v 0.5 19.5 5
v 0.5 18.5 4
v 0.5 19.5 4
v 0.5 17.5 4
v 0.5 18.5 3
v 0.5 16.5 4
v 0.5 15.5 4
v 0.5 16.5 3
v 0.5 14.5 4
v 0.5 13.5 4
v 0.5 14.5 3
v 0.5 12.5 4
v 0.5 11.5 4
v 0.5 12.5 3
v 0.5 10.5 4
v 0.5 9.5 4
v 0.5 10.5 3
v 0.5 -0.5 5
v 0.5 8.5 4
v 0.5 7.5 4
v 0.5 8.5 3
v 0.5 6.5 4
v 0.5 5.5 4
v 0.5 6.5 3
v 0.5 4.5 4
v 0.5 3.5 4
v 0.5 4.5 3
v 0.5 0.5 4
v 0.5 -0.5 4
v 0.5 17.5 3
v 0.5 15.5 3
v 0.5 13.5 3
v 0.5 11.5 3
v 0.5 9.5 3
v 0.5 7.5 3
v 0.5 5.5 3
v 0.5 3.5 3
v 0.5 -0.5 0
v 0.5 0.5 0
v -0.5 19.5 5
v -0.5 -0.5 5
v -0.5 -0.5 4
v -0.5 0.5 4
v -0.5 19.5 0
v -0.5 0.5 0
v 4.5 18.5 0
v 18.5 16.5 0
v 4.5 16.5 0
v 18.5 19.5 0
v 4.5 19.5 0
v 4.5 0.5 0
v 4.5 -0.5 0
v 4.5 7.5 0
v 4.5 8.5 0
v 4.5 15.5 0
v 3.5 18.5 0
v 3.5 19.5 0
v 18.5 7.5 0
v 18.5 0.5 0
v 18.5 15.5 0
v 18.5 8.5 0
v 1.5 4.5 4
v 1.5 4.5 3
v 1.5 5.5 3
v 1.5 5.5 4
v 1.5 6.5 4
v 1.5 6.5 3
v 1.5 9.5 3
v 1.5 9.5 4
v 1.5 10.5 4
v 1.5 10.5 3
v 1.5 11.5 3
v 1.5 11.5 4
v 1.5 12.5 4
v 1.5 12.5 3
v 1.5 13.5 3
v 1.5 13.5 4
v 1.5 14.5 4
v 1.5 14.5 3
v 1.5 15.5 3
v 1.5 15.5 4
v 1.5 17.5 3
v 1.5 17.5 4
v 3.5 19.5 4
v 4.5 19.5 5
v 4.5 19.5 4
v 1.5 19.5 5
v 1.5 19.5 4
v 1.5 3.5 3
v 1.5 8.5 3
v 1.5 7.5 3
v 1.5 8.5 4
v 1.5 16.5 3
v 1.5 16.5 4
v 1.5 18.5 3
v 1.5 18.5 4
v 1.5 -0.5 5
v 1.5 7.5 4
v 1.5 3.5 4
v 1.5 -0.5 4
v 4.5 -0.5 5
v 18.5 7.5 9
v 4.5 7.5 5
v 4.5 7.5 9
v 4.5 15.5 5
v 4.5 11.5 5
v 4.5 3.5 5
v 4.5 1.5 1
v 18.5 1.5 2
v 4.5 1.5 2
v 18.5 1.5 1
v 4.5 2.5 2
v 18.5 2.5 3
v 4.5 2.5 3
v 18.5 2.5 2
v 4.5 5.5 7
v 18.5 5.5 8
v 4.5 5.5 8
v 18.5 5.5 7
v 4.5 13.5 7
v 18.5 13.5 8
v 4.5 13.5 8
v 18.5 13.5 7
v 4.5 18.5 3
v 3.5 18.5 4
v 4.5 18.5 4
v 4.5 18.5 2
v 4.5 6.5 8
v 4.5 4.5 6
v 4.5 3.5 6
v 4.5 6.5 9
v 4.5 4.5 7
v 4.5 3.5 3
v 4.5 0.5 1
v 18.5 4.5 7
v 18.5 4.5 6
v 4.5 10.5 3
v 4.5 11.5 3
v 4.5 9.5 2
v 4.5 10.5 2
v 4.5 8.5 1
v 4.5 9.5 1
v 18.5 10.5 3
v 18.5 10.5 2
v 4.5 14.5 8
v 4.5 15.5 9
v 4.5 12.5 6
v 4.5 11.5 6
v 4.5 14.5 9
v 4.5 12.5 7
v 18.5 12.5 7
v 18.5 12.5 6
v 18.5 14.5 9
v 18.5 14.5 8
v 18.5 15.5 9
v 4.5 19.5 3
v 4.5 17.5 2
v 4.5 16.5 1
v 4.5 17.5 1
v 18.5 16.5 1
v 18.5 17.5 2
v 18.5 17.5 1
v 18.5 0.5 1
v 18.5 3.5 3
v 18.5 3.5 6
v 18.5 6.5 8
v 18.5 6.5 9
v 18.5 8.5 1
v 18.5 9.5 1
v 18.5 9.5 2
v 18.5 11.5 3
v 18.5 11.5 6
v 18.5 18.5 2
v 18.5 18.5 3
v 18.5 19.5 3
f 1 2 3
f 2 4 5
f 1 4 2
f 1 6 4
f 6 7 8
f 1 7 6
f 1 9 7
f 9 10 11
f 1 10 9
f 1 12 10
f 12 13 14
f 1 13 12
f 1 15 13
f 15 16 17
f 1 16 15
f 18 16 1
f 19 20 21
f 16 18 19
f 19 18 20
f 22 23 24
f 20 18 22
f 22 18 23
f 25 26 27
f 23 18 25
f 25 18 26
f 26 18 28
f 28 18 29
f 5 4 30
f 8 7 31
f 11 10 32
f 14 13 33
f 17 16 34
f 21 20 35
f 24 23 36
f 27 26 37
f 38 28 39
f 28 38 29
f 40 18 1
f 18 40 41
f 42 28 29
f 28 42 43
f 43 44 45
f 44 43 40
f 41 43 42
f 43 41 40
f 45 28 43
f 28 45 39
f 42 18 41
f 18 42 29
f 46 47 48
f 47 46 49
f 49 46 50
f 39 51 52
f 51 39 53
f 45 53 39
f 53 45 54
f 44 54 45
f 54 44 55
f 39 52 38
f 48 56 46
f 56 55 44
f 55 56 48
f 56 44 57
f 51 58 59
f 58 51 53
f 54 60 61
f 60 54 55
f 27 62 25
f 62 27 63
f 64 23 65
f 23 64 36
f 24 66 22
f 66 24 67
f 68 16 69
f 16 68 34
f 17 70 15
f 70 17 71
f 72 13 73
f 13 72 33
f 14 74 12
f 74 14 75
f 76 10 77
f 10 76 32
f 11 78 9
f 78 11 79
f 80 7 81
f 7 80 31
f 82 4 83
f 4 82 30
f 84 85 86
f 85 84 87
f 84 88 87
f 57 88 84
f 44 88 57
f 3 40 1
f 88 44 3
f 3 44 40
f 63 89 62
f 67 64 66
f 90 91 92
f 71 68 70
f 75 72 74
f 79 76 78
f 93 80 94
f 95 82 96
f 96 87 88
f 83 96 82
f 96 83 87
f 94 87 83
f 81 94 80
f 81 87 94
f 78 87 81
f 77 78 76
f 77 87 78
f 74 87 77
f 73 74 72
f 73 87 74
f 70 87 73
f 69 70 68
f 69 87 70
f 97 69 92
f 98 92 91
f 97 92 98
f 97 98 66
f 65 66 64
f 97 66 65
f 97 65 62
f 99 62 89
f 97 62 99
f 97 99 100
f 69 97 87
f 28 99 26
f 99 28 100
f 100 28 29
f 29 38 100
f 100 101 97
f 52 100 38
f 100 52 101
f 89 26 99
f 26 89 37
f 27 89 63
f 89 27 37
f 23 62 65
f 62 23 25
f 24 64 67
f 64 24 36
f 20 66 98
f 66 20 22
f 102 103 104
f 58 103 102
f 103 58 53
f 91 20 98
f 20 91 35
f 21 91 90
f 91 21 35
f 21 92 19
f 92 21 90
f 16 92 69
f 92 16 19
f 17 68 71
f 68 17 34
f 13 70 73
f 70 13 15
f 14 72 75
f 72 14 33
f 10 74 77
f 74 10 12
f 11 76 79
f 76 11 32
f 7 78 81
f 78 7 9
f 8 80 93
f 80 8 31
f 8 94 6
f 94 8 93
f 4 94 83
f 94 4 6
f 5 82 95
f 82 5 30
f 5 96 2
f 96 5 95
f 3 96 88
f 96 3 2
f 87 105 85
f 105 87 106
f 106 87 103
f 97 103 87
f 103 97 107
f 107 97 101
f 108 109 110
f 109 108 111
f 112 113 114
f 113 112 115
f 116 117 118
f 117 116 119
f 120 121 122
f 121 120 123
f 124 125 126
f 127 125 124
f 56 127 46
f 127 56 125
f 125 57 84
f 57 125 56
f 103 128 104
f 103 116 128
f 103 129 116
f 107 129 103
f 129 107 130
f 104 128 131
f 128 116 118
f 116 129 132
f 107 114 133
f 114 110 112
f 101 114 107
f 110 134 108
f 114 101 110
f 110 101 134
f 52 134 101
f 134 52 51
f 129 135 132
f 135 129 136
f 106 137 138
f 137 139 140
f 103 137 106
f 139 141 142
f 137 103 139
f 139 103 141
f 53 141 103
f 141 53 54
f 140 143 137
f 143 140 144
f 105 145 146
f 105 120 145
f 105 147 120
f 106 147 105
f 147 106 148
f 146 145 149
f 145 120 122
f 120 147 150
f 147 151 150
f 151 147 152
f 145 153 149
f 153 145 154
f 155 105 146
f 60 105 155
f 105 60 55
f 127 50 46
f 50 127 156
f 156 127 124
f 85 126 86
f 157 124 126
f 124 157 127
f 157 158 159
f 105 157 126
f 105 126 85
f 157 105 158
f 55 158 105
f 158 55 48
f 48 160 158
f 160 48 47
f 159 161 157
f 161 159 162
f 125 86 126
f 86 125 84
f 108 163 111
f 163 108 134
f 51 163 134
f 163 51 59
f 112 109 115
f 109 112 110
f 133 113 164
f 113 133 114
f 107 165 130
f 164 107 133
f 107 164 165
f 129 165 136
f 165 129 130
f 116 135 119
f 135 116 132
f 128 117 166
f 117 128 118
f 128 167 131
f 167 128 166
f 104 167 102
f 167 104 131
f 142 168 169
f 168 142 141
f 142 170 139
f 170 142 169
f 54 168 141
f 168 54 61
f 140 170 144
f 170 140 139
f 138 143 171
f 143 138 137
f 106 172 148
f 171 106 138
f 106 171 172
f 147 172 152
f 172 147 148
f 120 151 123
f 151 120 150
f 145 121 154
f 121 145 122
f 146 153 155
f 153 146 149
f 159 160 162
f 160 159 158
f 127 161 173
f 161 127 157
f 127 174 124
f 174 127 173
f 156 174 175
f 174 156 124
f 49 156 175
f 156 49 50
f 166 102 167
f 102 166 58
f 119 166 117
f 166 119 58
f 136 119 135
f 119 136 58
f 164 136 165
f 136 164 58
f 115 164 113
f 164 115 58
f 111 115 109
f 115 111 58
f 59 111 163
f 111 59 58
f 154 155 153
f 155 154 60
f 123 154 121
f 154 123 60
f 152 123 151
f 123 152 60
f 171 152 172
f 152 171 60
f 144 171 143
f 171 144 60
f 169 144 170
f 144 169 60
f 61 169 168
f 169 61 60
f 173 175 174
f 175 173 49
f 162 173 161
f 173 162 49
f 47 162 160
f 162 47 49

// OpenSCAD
union() {
    translate([0, 0, 4.5]) color([1, 0, 0]) cube([1, 1, 1], center=true);
    translate([0, 1, 2.5]) cube([1, 1, 5], center=true);
    translate([0, 2, 2.5]) cube([1, 1, 5], center=true);
    translate([0, 3, 2.5]) cube([1, 1, 5], center=true);
    translate([0, 4, 2.5]) cube([1, 1, 5], center=true);
    translate([0, 5, 2.5]) cube([1, 1, 5], center=true);
    translate([0, 6, 2.5]) cube([1, 1, 5], center=true);
    translate([0, 7, 2.5]) cube([1, 1, 5], center=true);
    translate([0, 8, 2.5]) cube([1, 1, 5], center=true);
    translate([0, 9, 2.5]) cube([1, 1, 5], center=true);
    translate([0, 10, 2.5]) cube([1, 1, 5], center=true);
    translate([0, 11, 2.5]) cube([1, 1, 5], center=true);
    translate([0, 12, 2.5]) cube([1, 1, 5], center=true);
    translate([0, 13, 2.5]) cube([1, 1, 5], center=true);
    translate([0, 14, 2.5]) cube([1, 1, 5], center=true);
    translate([0, 15, 2.5]) cube([1, 1, 5], center=true);
    translate([0, 16, 2.5]) cube([1, 1, 5], center=true);
    translate([0, 17, 2.5]) cube([1, 1, 5], center=true);
    translate([0, 18, 2.5]) cube([1, 1, 5], center=true);
    translate([0, 19, 2.5]) cube([1, 1, 5], center=true);
    translate([1, 0, 2.0]) cube([1, 1, 4], center=true);
    translate([1, 1, 2.0]) cube([1, 1, 4], center=true);
    translate([1, 2, 2.0]) cube([1, 1, 4], center=true);
    translate([1, 3, 2.0]) cube([1, 1, 4], center=true);
    translate([1, 4, 1.5]) cube([1, 1, 3], center=true);
    translate([1, 5, 2.0]) cube([1, 1, 4], center=true);
    translate([1, 6, 1.5]) cube([1, 1, 3], center=true);
    translate([1, 7, 2.0]) cube([1, 1, 4], center=true);
    translate([1, 8, 1.5]) cube([1, 1, 3], center=true);
    translate([1, 9, 2.0]) cube([1, 1, 4], center=true);
    translate([1, 10, 1.5]) cube([1, 1, 3], center=true);
    translate([1, 11, 2.0]) cube([1, 1, 4], center=true);
    translate([1, 12, 1.5]) cube([1, 1, 3], center=true);
    translate([1, 13, 2.0]) cube([1, 1, 4], center=true);
    translate([1, 14, 1.5]) cube([1, 1, 3], center=true);
    translate([1, 15, 2.0]) cube([1, 1, 4], center=true);
    translate([1, 16, 1.5]) cube([1, 1, 3], center=true);
    translate([1, 17, 2.0]) cube([1, 1, 4], center=true);
    translate([1, 18, 1.5]) cube([1, 1, 3], center=true);
    translate([1, 19, 2.0]) cube([1, 1, 4], center=true);
    translate([2, 0, 2.5]) cube([1, 1, 5], center=true);
    translate([2, 1, 2.5]) cube([1, 1, 5], center=true);
    translate([2, 2, 2.5]) cube([1, 1, 5], center=true);
    translate([2, 3, 2.5]) cube([1, 1, 5], center=true);
    translate([2, 4, 2.5]) cube([1, 1, 5], center=true);
    translate([2, 5, 2.5]) cube([1, 1, 5], center=true);
    translate([2, 6, 2.5]) cube([1, 1, 5], center=true);
    translate([2, 7, 2.5]) cube([1, 1, 5], center=true);
    translate([2, 8, 2.5]) cube([1, 1, 5], center=true);
    translate([2, 9, 2.5]) cube([1, 1, 5], center=true);
    translate([2, 10, 2.5]) cube([1, 1, 5], center=true);
    translate([2, 11, 2.5]) cube([1, 1, 5], center=true);
    translate([2, 12, 2.5]) cube([1, 1, 5], center=true);
    translate([2, 13, 2.5]) cube([1, 1, 5], center=true);
    translate([2, 14, 2.5]) cube([1, 1, 5], center=true);
    translate([2, 15, 2.5]) cube([1, 1, 5], center=true);
    translate([2, 16, 2.5]) cube([1, 1, 5], center=true);
    translate([2, 17, 2.5]) cube([1, 1, 5], center=true);
    translate([2, 18, 2.5]) cube([1, 1, 5], center=true);
    translate([2, 19, 2.5]) cube([1, 1, 5], center=true);
    translate([3, 0, 2.5]) cube([1, 1, 5], center=true);
    translate([3, 1, 2.5]) cube([1, 1, 5], center=true);
    translate([3, 2, 2.5]) cube([1, 1, 5], center=true);
    translate([3, 3, 2.5]) cube([1, 1, 5], center=true);
    translate([3, 4, 2.5]) cube([1, 1, 5], center=true);
    translate([3, 5, 2.5]) cube([1, 1, 5], center=true);
    translate([3, 6, 2.5]) cube([1, 1, 5], center=true);
    translate([3, 7, 2.5]) cube([1, 1, 5], center=true);
    translate([3, 8, 2.5]) cube([1, 1, 5], center=true);
    translate([3, 9, 2.5]) cube([1, 1, 5], center=true);
    translate([3, 10, 2.5]) cube([1, 1, 5], center=true);
    translate([3, 11, 2.5]) cube([1, 1, 5], center=true);
    translate([3, 12, 2.5]) cube([1, 1, 5], center=true);
    translate([3, 13, 2.5]) cube([1, 1, 5], center=true);
    translate([3, 14, 2.5]) cube([1, 1, 5], center=true);
    translate([3, 15, 2.5]) cube([1, 1, 5], center=true);
    translate([3, 16, 2.5]) cube([1, 1, 5], center=true);
    translate([3, 17, 2.5]) cube([1, 1, 5], center=true);
    translate([3, 18, 2.5]) cube([1, 1, 5], center=true);
    translate([3, 19, 2.5]) cube([1, 1, 5], center=true);
    translate([4, 0, 2.5]) cube([1, 1, 5], center=true);
    translate([4, 1, 2.5]) cube([1, 1, 5], center=true);
    translate([4, 2, 2.5]) cube([1, 1, 5], center=true);
    translate([4, 3, 2.5]) cube([1, 1, 5], center=true);
    translate([4, 4, 2.5]) cube([1, 1, 5], center=true);
    translate([4, 5, 2.5]) cube([1, 1, 5], center=true);
    translate([4, 6, 2.5]) cube([1, 1, 5], center=true);
    translate([4, 7, 2.5]) cube([1, 1, 5], center=true);
    translate([4, 8, 2.5]) cube([1, 1, 5], center=true);
    translate([4, 9, 2.5]) cube([1, 1, 5], center=true);
    translate([4, 10, 2.5]) cube([1, 1, 5], center=true);
    translate([4, 11, 2.5]) cube([1, 1, 5], center=true);
    translate([4, 12, 2.5]) cube([1, 1, 5], center=true);
    translate([4, 13, 2.5]) cube([1, 1, 5], center=true);
    translate([4, 14, 2.5]) cube([1, 1, 5], center=true);
    translate([4, 15, 2.5]) cube([1, 1, 5], center=true);
    translate([4, 16, 2.5]) cube([1, 1, 5], center=true);
    translate([4, 17, 2.5]) cube([1, 1, 5], center=true);
    translate([4, 18, 2.5]) cube([1, 1, 5], center=true);
    translate([4, 19, 4.5]) color([0, 0, 1]) cube([1, 1, 1], center=true);
    translate([5, 1, 0.5]) cube([1, 1, 1], center=true);
    translate([5, 2, 1.0]) cube([1, 1, 2], center=true);
    translate([5, 3, 1.5]) cube([1, 1, 3], center=true);
    translate([5, 4, 3.0]) cube([1, 1, 6], center=true);
    translate([5, 5, 3.5]) cube([1, 1, 7], center=true);
    translate([5, 6, 4.0]) cube([1, 1, 8], center=true);
    translate([5, 7, 4.5]) cube([1, 1, 9], center=true);
    translate([5, 9, 0.5]) cube([1, 1, 1], center=true);
    translate([5, 10, 1.0]) cube([1, 1, 2], center=true);
    translate([5, 11, 1.5]) cube([1, 1, 3], center=true);
    translate([5, 12, 3.0]) cube([1, 1, 6], center=true);
    translate([5, 13, 3.5]) cube([1, 1, 7], center=true);
    translate([5, 14, 4.0]) cube([1, 1, 8], center=true);
    translate([5, 15, 4.5]) cube([1, 1, 9], center=true);
    translate([5, 17, 0.5]) cube([1, 1, 1], center=true);
    translate([5, 18, 1.0]) cube([1, 1, 2], center=true);
    translate([5, 19, 1.5]) cube([1, 1, 3], center=true);
    translate([6, 1, 0.5]) cube([1, 1, 1], center=true);
    translate([6, 2, 1.0]) cube([1, 1, 2], center=true);
    translate([6, 3, 1.5]) cube([1, 1, 3], center=true);
    translate([6, 4, 3.0]) cube([1, 1, 6], center=true);
    translate([6, 5, 3.5]) cube([1, 1, 7], center=true);
    translate([6, 6, 4.0]) cube([1, 1, 8], center=true);
    translate([6, 7, 4.5]) cube([1, 1, 9], center=true);
    translate([6, 9, 0.5]) cube([1, 1, 1], center=true);
    translate([6, 10, 1.0]) cube([1, 1, 2], center=true);
    translate([6, 11, 1.5]) cube([1, 1, 3], center=true);
    translate([6, 12, 3.0]) cube([1, 1, 6], center=true);
    translate([6, 13, 3.5]) cube([1, 1, 7], center=true);
    translate([6, 14, 4.0]) cube([1, 1, 8], center=true);
    translate([6, 15, 4.5]) cube([1, 1, 9], center=true);
    translate([6, 17, 0.5]) cube([1, 1, 1], center=true);
    translate([6, 18, 1.0]) cube([1, 1, 2], center=true);
    translate([6, 19, 1.5]) cube([1, 1, 3], center=true);
    translate([7, 1, 0.5]) cube([1, 1, 1], center=true);
    translate([7, 2, 1.0]) cube([1, 1, 2], center=true);
    translate([7, 3, 1.5]) cube([1, 1, 3], center=true);
    translate([7, 4, 3.0]) cube([1, 1, 6], center=true);
    translate([7, 5, 3.5]) cube([1, 1, 7], center=true);
    translate([7, 6, 4.0]) cube([1, 1, 8], center=true);
    translate([7, 7, 4.5]) cube([1, 1, 9], center=true);
    translate([7, 9, 0.5]) cube([1, 1, 1], center=true);
    translate([7, 10, 1.0]) cube([1, 1, 2], center=true);
    translate([7, 11, 1.5]) cube([1, 1, 3], center=true);
    translate([7, 12, 3.0]) cube([1, 1, 6], center=true);
    translate([7, 13, 3.5]) cube([1, 1, 7], center=true);
    translate([7, 14, 4.0]) cube([1, 1, 8], center=true);
    translate([7, 15, 4.5]) cube([1, 1, 9], center=true);
    translate([7, 17, 0.5]) cube([1, 1, 1], center=true);
    translate([7, 18, 1.0]) cube([1, 1, 2], center=true);
    translate([7, 19, 1.5]) cube([1, 1, 3], center=true);
    translate([8, 1, 0.5]) cube([1, 1, 1], center=true);
    translate([8, 2, 1.0]) cube([1, 1, 2], center=true);
    translate([8, 3, 1.5]) cube([1, 1, 3], center=true);
    translate([8, 4, 3.0]) cube([1, 1, 6], center=true);
    translate([8, 5, 3.5]) cube([1, 1, 7], center=true);
    translate([8, 6, 4.0]) cube([1, 1, 8], center=true);
    translate([8, 7, 4.5]) cube([1, 1, 9], center=true);
    translate([8, 9, 0.5]) cube([1, 1, 1], center=true);
    translate([8, 10, 1.0]) cube([1, 1, 2], center=true);
    translate([8, 11, 1.5]) cube([1, 1, 3], center=true);
    translate([8, 12, 3.0]) cube([1, 1, 6], center=true);
    translate([8, 13, 3.5]) cube([1, 1, 7], center=true);
    translate([8, 14, 4.0]) cube([1, 1, 8], center=true);
    translate([8, 15, 4.5]) cube([1, 1, 9], center=true);
    translate([8, 17, 0.5]) cube([1, 1, 1], center=true);
    translate([8, 18, 1.0]) cube([1, 1, 2], center=true);
    translate([8, 19, 1.5]) cube([1, 1, 3], center=true);
    translate([9, 1, 0.5]) cube([1, 1, 1], center=true);
    translate([9, 2, 1.0]) cube([1, 1, 2], center=true);
    translate([9, 3, 1.5]) cube([1, 1, 3], center=true);
    translate([9, 4, 3.0]) cube([1, 1, 6], center=true);
    translate([9, 5, 3.5]) cube([1, 1, 7], center=true);
    translate([9, 6, 4.0]) cube([1, 1, 8], center=true);
    translate([9, 7, 4.5]) cube([1, 1, 9], center=true);
    translate([9, 9, 0.5]) cube([1, 1, 1], center=true);
    translate([9, 10, 1.0]) cube([1, 1, 2], center=true);
    translate([9, 11, 1.5]) cube([1, 1, 3], center=true);
    translate([9, 12, 3.0]) cube([1, 1, 6], center=true);
    translate([9, 13, 3.5]) cube([1, 1, 7], center=true);
    translate([9, 14, 4.0]) cube([1, 1, 8], center=true);
    translate([9, 15, 4.5]) cube([1, 1, 9], center=true);
    translate([9, 17, 0.5]) cube([1, 1, 1], center=true);
    translate([9, 18, 1.0]) cube([1, 1, 2], center=true);
    translate([9, 19, 1.5]) cube([1, 1, 3], center=true);
    translate([10, 1, 0.5]) cube([1, 1, 1], center=true);
    translate([10, 2, 1.0]) cube([1, 1, 2], center=true);
    translate([10, 3, 1.5]) cube([1, 1, 3], center=true);
    translate([10, 4, 3.0]) cube([1, 1, 6], center=true);
    translate([10, 5, 3.5]) cube([1, 1, 7], center=true);
    translate([10, 6, 4.0]) cube([1, 1, 8], center=true);
    translate([10, 7, 4.5]) cube([1, 1, 9], center=true);
    translate([10, 9, 0.5]) cube([1, 1, 1], center=true);
    translate([10, 10, 1.0]) cube([1, 1, 2], center=true);
    translate([10, 11, 1.5]) cube([1, 1, 3], center=true);
    translate([10, 12, 3.0]) cube([1, 1, 6], center=true);
    translate([10, 13, 3.5]) cube([1, 1, 7], center=true);
    translate([10, 14, 4.0]) cube([1, 1, 8], center=true);
    translate([10, 15, 4.5]) cube([1, 1, 9], center=true);
    translate([10, 17, 0.5]) cube([1, 1, 1], center=true);
    translate([10, 18, 1.0]) cube([1, 1, 2], center=true);
    translate([10, 19, 1.5]) cube([1, 1, 3], center=true);
    translate([11, 1, 0.5]) cube([1, 1, 1], center=true);
    translate([11, 2, 1.0]) cube([1, 1, 2], center=true);
    translate([11, 3, 1.5]) cube([1, 1, 3], center=true);
    translate([11, 4, 3.0]) cube([1, 1, 6], center=true);
    translate([11, 5, 3.5]) cube([1, 1, 7], center=true);
    translate([11, 6, 4.0]) cube([1, 1, 8], center=true);
    translate([11, 7, 4.5]) cube([1, 1, 9], center=true);
    translate([11, 9, 0.5]) cube([1, 1, 1], center=true);
    translate([11, 10, 1.0]) cube([1, 1, 2], center=true);
    translate([11, 11, 1.5]) cube([1, 1, 3], center=true);
    translate([11, 12, 3.0]) cube([1, 1, 6], center=true);
    translate([11, 13, 3.5]) cube([1, 1, 7], center=true);
    translate([11, 14, 4.0]) cube([1, 1, 8], center=true);
    translate([11, 15, 4.5]) cube([1, 1, 9], center=true);
    translate([11, 17, 0.5]) cube([1, 1, 1], center=true);
    translate([11, 18, 1.0]) cube([1, 1, 2], center=true);
    translate([11, 19, 1.5]) cube([1, 1, 3], center=true);
    translate([12, 1, 0.5]) cube([1, 1, 1], center=true);
    translate([12, 2, 1.0]) cube([1, 1, 2], center=true);
    translate([12, 3, 1.5]) cube([1, 1, 3], center=true);
    translate([12, 4, 3.0]) cube([1, 1, 6], center=true);
    translate([12, 5, 3.5]) cube([1, 1, 7], center=true);
    translate([12, 6, 4.0]) cube([1, 1, 8], center=true);
    translate([12, 7, 4.5]) cube([1, 1, 9], center=true);
    translate([12, 9, 0.5]) cube([1, 1, 1], center=true);
    translate([12, 10, 1.0]) cube([1, 1, 2], center=true);
    translate([12, 11, 1.5]) cube([1, 1, 3], center=true);
    translate([12, 12, 3.0]) cube([1, 1, 6], center=true);
    translate([12, 13, 3.5]) cube([1, 1, 7], center=true);
    translate([12, 14, 4.0]) cube([1, 1, 8], center=true);
    translate([12, 15, 4.5]) cube([1, 1, 9], center=true);
    translate([12, 17, 0.5]) cube([1, 1, 1], center=true);
    translate([12, 18, 1.0]) cube([1, 1, 2], center=true);
    translate([12, 19, 1.5]) cube([1, 1, 3], center=true);
    translate([13, 1, 0.5]) cube([1, 1, 1], center=true);
    translate([13, 2, 1.0]) cube([1, 1, 2], center=true);
    translate([13, 3, 1.5]) cube([1, 1, 3], center=true);
    translate([13, 4, 3.0]) cube([1, 1, 6], center=true);
    translate([13, 5, 3.5]) cube([1, 1, 7], center=true);
    translate([13, 6, 4.0]) cube([1, 1, 8], center=true);
    translate([13, 7, 4.5]) cube([1, 1, 9], center=true);
    translate([13, 9, 0.5]) cube([1, 1, 1], center=true);
    translate([13, 10, 1.0]) cube([1, 1, 2], center=true);
    translate([13, 11, 1.5]) cube([1, 1, 3], center=true);
    translate([13, 12, 3.0]) cube([1, 1, 6], center=true);
    translate([13, 13, 3.5]) cube([1, 1, 7], center=true);
    translate([13, 14, 4.0]) cube([1, 1, 8], center=true);
    translate([13, 15, 4.5]) cube([1, 1, 9], center=true);
    translate([13, 17, 0.5]) cube([1, 1, 1], center=true);
    translate([13, 18, 1.0]) cube([1, 1, 2], center=true);
    translate([13, 19, 1.5]) cube([1, 1, 3], center=true);
    translate([14, 1, 0.5]) cube([1, 1, 1], center=true);
    translate([14, 2, 1.0]) cube([1, 1, 2], center=true);
    translate([14, 3, 1.5]) cube([1, 1, 3], center=true);
    translate([14, 4, 3.0]) cube([1, 1, 6], center=true);
    translate([14, 5, 3.5]) cube([1, 1, 7], center=true);
    translate([14, 6, 4.0]) cube([1, 1, 8], center=true);
    translate([14, 7, 4.5]) cube([1, 1, 9], center=true);
    translate([14, 9, 0.5]) cube([1, 1, 1], center=true);
    translate([14, 10, 1.0]) cube([1, 1, 2], center=true);
    translate([14, 11, 1.5]) cube([1, 1, 3], center=true);
    translate([14, 12, 3.0]) cube([1, 1, 6], center=true);
    translate([14, 13, 3.5]) cube([1, 1, 7], center=true);
    translate([14, 14, 4.0]) cube([1, 1, 8], center=true);
    translate([14, 15, 4.5]) cube([1, 1, 9], center=true);
    translate([14, 17, 0.5]) cube([1, 1, 1], center=true);
    translate([14, 18, 1.0]) cube([1, 1, 2], center=true);
    translate([14, 19, 1.5]) cube([1, 1, 3], center=true);
    translate([15, 1, 0.5]) cube([1, 1, 1], center=true);
    translate([15, 2, 1.0]) cube([1, 1, 2], center=true);
    translate([15, 3, 1.5]) cube([1, 1, 3], center=true);
    translate([15, 4, 3.0]) cube([1, 1, 6], center=true);
    translate([15, 5, 3.5]) cube([1, 1, 7], center=true);
    translate([15, 6, 4.0]) cube([1, 1, 8], center=true);
    translate([15, 7, 4.5]) cube([1, 1, 9], center=true);
    translate([15, 9, 0.5]) cube([1, 1, 1], center=true);
    translate([15, 10, 1.0]) cube([1, 1, 2], center=true);
    translate([15, 11, 1.5]) cube([1, 1, 3], center=true);
    translate([15, 12, 3.0]) cube([1, 1, 6], center=true);
    translate([15, 13, 3.5]) cube([1, 1, 7], center=true);
    translate([15, 14, 4.0]) cube([1, 1, 8], center=true);
    translate([15, 15, 4.5]) cube([1, 1, 9], center=true);
    translate([15, 17, 0.5]) cube([1, 1, 1], center=true);
    translate([15, 18, 1.0]) cube([1, 1, 2], center=true);
    translate([15, 19, 1.5]) cube([1, 1, 3], center=true);
    translate([16, 1, 0.5]) cube([1, 1, 1], center=true);
    translate([16, 2, 1.0]) cube([1, 1, 2], center=true);
    translate([16, 3, 1.5]) cube([1, 1, 3], center=true);
    translate([16, 4, 3.0]) cube([1, 1, 6], center=true);
    translate([16, 5, 3.5]) cube([1, 1, 7], center=true);
    translate([16, 6, 4.0]) cube([1, 1, 8], center=true);
    translate([16, 7, 4.5]) cube([1, 1, 9], center=true);
    translate([16, 9, 0.5]) cube([1, 1, 1], center=true);
    translate([16, 10, 1.0]) cube([1, 1, 2], center=true);
    translate([16, 11, 1.5]) cube([1, 1, 3], center=true);
    translate([16, 12, 3.0]) cube([1, 1, 6], center=true);
    translate([16, 13, 3.5]) cube([1, 1, 7], center=true);
    translate([16, 14, 4.0]) cube([1, 1, 8], center=true);
    translate([16, 15, 4.5]) cube([1, 1, 9], center=true);
    translate([16, 17, 0.5]) cube([1, 1, 1], center=true);
    translate([16, 18, 1.0]) cube([1, 1, 2], center=true);
    translate([16, 19, 1.5]) cube([1, 1, 3], center=true);
    translate([17, 1, 0.5]) cube([1, 1, 1], center=true);
    translate([17, 2, 1.0]) cube([1, 1, 2], center=true);
    translate([17, 3, 1.5]) cube([1, 1, 3], center=true);
    translate([17, 4, 3.0]) cube([1, 1, 6], center=true);
    translate([17, 5, 3.5]) cube([1, 1, 7], center=true);
    translate([17, 6, 4.0]) cube([1, 1, 8], center=true);
    translate([17, 7, 4.5]) cube([1, 1, 9], center=true);
    translate([17, 9, 0.5]) cube([1, 1, 1], center=true);
    translate([17, 10, 1.0]) cube([1, 1, 2], center=true);
    translate([17, 11, 1.5]) cube([1, 1, 3], center=true);
    translate([17, 12, 3.0]) cube([1, 1, 6], center=true);
    translate([17, 13, 3.5]) cube([1, 1, 7], center=true);
    translate([17, 14, 4.0]) cube([1, 1, 8], center=true);
    translate([17, 15, 4.5]) cube([1, 1, 9], center=true);
    translate([17, 17, 0.5]) cube([1, 1, 1], center=true);
    translate([17, 18, 1.0]) cube([1, 1, 2], center=true);
    translate([17, 19, 1.5]) cube([1, 1, 3], center=true);
    translate([18, 1, 0.5]) cube([1, 1, 1], center=true);
    translate([18, 2, 1.0]) cube([1, 1, 2], center=true);
    translate([18, 3, 1.5]) cube([1, 1, 3], center=true);
    translate([18, 4, 3.0]) cube([1, 1, 6], center=true);
    translate([18, 5, 3.5]) cube([1, 1, 7], center=true);
    translate([18, 6, 4.0]) cube([1, 1, 8], center=true);
    translate([18, 7, 4.5]) cube([1, 1, 9], center=true);
    translate([18, 9, 0.5]) cube([1, 1, 1], center=true);
    translate([18, 10, 1.0]) cube([1, 1, 2], center=true);
    translate([18, 11, 1.5]) cube([1, 1, 3], center=true);
    translate([18, 12, 3.0]) cube([1, 1, 6], center=true);
    translate([18, 13, 3.5]) cube([1, 1, 7], center=true);
    translate([18, 14, 4.0]) cube([1, 1, 8], center=true);
    translate([18, 15, 4.5]) cube([1, 1, 9], center=true);
    translate([18, 17, 0.5]) cube([1, 1, 1], center=true);
    translate([18, 18, 1.0]) cube([1, 1, 2], center=true);
    translate([18, 19, 1.5]) cube([1, 1, 3], center=true);
}
